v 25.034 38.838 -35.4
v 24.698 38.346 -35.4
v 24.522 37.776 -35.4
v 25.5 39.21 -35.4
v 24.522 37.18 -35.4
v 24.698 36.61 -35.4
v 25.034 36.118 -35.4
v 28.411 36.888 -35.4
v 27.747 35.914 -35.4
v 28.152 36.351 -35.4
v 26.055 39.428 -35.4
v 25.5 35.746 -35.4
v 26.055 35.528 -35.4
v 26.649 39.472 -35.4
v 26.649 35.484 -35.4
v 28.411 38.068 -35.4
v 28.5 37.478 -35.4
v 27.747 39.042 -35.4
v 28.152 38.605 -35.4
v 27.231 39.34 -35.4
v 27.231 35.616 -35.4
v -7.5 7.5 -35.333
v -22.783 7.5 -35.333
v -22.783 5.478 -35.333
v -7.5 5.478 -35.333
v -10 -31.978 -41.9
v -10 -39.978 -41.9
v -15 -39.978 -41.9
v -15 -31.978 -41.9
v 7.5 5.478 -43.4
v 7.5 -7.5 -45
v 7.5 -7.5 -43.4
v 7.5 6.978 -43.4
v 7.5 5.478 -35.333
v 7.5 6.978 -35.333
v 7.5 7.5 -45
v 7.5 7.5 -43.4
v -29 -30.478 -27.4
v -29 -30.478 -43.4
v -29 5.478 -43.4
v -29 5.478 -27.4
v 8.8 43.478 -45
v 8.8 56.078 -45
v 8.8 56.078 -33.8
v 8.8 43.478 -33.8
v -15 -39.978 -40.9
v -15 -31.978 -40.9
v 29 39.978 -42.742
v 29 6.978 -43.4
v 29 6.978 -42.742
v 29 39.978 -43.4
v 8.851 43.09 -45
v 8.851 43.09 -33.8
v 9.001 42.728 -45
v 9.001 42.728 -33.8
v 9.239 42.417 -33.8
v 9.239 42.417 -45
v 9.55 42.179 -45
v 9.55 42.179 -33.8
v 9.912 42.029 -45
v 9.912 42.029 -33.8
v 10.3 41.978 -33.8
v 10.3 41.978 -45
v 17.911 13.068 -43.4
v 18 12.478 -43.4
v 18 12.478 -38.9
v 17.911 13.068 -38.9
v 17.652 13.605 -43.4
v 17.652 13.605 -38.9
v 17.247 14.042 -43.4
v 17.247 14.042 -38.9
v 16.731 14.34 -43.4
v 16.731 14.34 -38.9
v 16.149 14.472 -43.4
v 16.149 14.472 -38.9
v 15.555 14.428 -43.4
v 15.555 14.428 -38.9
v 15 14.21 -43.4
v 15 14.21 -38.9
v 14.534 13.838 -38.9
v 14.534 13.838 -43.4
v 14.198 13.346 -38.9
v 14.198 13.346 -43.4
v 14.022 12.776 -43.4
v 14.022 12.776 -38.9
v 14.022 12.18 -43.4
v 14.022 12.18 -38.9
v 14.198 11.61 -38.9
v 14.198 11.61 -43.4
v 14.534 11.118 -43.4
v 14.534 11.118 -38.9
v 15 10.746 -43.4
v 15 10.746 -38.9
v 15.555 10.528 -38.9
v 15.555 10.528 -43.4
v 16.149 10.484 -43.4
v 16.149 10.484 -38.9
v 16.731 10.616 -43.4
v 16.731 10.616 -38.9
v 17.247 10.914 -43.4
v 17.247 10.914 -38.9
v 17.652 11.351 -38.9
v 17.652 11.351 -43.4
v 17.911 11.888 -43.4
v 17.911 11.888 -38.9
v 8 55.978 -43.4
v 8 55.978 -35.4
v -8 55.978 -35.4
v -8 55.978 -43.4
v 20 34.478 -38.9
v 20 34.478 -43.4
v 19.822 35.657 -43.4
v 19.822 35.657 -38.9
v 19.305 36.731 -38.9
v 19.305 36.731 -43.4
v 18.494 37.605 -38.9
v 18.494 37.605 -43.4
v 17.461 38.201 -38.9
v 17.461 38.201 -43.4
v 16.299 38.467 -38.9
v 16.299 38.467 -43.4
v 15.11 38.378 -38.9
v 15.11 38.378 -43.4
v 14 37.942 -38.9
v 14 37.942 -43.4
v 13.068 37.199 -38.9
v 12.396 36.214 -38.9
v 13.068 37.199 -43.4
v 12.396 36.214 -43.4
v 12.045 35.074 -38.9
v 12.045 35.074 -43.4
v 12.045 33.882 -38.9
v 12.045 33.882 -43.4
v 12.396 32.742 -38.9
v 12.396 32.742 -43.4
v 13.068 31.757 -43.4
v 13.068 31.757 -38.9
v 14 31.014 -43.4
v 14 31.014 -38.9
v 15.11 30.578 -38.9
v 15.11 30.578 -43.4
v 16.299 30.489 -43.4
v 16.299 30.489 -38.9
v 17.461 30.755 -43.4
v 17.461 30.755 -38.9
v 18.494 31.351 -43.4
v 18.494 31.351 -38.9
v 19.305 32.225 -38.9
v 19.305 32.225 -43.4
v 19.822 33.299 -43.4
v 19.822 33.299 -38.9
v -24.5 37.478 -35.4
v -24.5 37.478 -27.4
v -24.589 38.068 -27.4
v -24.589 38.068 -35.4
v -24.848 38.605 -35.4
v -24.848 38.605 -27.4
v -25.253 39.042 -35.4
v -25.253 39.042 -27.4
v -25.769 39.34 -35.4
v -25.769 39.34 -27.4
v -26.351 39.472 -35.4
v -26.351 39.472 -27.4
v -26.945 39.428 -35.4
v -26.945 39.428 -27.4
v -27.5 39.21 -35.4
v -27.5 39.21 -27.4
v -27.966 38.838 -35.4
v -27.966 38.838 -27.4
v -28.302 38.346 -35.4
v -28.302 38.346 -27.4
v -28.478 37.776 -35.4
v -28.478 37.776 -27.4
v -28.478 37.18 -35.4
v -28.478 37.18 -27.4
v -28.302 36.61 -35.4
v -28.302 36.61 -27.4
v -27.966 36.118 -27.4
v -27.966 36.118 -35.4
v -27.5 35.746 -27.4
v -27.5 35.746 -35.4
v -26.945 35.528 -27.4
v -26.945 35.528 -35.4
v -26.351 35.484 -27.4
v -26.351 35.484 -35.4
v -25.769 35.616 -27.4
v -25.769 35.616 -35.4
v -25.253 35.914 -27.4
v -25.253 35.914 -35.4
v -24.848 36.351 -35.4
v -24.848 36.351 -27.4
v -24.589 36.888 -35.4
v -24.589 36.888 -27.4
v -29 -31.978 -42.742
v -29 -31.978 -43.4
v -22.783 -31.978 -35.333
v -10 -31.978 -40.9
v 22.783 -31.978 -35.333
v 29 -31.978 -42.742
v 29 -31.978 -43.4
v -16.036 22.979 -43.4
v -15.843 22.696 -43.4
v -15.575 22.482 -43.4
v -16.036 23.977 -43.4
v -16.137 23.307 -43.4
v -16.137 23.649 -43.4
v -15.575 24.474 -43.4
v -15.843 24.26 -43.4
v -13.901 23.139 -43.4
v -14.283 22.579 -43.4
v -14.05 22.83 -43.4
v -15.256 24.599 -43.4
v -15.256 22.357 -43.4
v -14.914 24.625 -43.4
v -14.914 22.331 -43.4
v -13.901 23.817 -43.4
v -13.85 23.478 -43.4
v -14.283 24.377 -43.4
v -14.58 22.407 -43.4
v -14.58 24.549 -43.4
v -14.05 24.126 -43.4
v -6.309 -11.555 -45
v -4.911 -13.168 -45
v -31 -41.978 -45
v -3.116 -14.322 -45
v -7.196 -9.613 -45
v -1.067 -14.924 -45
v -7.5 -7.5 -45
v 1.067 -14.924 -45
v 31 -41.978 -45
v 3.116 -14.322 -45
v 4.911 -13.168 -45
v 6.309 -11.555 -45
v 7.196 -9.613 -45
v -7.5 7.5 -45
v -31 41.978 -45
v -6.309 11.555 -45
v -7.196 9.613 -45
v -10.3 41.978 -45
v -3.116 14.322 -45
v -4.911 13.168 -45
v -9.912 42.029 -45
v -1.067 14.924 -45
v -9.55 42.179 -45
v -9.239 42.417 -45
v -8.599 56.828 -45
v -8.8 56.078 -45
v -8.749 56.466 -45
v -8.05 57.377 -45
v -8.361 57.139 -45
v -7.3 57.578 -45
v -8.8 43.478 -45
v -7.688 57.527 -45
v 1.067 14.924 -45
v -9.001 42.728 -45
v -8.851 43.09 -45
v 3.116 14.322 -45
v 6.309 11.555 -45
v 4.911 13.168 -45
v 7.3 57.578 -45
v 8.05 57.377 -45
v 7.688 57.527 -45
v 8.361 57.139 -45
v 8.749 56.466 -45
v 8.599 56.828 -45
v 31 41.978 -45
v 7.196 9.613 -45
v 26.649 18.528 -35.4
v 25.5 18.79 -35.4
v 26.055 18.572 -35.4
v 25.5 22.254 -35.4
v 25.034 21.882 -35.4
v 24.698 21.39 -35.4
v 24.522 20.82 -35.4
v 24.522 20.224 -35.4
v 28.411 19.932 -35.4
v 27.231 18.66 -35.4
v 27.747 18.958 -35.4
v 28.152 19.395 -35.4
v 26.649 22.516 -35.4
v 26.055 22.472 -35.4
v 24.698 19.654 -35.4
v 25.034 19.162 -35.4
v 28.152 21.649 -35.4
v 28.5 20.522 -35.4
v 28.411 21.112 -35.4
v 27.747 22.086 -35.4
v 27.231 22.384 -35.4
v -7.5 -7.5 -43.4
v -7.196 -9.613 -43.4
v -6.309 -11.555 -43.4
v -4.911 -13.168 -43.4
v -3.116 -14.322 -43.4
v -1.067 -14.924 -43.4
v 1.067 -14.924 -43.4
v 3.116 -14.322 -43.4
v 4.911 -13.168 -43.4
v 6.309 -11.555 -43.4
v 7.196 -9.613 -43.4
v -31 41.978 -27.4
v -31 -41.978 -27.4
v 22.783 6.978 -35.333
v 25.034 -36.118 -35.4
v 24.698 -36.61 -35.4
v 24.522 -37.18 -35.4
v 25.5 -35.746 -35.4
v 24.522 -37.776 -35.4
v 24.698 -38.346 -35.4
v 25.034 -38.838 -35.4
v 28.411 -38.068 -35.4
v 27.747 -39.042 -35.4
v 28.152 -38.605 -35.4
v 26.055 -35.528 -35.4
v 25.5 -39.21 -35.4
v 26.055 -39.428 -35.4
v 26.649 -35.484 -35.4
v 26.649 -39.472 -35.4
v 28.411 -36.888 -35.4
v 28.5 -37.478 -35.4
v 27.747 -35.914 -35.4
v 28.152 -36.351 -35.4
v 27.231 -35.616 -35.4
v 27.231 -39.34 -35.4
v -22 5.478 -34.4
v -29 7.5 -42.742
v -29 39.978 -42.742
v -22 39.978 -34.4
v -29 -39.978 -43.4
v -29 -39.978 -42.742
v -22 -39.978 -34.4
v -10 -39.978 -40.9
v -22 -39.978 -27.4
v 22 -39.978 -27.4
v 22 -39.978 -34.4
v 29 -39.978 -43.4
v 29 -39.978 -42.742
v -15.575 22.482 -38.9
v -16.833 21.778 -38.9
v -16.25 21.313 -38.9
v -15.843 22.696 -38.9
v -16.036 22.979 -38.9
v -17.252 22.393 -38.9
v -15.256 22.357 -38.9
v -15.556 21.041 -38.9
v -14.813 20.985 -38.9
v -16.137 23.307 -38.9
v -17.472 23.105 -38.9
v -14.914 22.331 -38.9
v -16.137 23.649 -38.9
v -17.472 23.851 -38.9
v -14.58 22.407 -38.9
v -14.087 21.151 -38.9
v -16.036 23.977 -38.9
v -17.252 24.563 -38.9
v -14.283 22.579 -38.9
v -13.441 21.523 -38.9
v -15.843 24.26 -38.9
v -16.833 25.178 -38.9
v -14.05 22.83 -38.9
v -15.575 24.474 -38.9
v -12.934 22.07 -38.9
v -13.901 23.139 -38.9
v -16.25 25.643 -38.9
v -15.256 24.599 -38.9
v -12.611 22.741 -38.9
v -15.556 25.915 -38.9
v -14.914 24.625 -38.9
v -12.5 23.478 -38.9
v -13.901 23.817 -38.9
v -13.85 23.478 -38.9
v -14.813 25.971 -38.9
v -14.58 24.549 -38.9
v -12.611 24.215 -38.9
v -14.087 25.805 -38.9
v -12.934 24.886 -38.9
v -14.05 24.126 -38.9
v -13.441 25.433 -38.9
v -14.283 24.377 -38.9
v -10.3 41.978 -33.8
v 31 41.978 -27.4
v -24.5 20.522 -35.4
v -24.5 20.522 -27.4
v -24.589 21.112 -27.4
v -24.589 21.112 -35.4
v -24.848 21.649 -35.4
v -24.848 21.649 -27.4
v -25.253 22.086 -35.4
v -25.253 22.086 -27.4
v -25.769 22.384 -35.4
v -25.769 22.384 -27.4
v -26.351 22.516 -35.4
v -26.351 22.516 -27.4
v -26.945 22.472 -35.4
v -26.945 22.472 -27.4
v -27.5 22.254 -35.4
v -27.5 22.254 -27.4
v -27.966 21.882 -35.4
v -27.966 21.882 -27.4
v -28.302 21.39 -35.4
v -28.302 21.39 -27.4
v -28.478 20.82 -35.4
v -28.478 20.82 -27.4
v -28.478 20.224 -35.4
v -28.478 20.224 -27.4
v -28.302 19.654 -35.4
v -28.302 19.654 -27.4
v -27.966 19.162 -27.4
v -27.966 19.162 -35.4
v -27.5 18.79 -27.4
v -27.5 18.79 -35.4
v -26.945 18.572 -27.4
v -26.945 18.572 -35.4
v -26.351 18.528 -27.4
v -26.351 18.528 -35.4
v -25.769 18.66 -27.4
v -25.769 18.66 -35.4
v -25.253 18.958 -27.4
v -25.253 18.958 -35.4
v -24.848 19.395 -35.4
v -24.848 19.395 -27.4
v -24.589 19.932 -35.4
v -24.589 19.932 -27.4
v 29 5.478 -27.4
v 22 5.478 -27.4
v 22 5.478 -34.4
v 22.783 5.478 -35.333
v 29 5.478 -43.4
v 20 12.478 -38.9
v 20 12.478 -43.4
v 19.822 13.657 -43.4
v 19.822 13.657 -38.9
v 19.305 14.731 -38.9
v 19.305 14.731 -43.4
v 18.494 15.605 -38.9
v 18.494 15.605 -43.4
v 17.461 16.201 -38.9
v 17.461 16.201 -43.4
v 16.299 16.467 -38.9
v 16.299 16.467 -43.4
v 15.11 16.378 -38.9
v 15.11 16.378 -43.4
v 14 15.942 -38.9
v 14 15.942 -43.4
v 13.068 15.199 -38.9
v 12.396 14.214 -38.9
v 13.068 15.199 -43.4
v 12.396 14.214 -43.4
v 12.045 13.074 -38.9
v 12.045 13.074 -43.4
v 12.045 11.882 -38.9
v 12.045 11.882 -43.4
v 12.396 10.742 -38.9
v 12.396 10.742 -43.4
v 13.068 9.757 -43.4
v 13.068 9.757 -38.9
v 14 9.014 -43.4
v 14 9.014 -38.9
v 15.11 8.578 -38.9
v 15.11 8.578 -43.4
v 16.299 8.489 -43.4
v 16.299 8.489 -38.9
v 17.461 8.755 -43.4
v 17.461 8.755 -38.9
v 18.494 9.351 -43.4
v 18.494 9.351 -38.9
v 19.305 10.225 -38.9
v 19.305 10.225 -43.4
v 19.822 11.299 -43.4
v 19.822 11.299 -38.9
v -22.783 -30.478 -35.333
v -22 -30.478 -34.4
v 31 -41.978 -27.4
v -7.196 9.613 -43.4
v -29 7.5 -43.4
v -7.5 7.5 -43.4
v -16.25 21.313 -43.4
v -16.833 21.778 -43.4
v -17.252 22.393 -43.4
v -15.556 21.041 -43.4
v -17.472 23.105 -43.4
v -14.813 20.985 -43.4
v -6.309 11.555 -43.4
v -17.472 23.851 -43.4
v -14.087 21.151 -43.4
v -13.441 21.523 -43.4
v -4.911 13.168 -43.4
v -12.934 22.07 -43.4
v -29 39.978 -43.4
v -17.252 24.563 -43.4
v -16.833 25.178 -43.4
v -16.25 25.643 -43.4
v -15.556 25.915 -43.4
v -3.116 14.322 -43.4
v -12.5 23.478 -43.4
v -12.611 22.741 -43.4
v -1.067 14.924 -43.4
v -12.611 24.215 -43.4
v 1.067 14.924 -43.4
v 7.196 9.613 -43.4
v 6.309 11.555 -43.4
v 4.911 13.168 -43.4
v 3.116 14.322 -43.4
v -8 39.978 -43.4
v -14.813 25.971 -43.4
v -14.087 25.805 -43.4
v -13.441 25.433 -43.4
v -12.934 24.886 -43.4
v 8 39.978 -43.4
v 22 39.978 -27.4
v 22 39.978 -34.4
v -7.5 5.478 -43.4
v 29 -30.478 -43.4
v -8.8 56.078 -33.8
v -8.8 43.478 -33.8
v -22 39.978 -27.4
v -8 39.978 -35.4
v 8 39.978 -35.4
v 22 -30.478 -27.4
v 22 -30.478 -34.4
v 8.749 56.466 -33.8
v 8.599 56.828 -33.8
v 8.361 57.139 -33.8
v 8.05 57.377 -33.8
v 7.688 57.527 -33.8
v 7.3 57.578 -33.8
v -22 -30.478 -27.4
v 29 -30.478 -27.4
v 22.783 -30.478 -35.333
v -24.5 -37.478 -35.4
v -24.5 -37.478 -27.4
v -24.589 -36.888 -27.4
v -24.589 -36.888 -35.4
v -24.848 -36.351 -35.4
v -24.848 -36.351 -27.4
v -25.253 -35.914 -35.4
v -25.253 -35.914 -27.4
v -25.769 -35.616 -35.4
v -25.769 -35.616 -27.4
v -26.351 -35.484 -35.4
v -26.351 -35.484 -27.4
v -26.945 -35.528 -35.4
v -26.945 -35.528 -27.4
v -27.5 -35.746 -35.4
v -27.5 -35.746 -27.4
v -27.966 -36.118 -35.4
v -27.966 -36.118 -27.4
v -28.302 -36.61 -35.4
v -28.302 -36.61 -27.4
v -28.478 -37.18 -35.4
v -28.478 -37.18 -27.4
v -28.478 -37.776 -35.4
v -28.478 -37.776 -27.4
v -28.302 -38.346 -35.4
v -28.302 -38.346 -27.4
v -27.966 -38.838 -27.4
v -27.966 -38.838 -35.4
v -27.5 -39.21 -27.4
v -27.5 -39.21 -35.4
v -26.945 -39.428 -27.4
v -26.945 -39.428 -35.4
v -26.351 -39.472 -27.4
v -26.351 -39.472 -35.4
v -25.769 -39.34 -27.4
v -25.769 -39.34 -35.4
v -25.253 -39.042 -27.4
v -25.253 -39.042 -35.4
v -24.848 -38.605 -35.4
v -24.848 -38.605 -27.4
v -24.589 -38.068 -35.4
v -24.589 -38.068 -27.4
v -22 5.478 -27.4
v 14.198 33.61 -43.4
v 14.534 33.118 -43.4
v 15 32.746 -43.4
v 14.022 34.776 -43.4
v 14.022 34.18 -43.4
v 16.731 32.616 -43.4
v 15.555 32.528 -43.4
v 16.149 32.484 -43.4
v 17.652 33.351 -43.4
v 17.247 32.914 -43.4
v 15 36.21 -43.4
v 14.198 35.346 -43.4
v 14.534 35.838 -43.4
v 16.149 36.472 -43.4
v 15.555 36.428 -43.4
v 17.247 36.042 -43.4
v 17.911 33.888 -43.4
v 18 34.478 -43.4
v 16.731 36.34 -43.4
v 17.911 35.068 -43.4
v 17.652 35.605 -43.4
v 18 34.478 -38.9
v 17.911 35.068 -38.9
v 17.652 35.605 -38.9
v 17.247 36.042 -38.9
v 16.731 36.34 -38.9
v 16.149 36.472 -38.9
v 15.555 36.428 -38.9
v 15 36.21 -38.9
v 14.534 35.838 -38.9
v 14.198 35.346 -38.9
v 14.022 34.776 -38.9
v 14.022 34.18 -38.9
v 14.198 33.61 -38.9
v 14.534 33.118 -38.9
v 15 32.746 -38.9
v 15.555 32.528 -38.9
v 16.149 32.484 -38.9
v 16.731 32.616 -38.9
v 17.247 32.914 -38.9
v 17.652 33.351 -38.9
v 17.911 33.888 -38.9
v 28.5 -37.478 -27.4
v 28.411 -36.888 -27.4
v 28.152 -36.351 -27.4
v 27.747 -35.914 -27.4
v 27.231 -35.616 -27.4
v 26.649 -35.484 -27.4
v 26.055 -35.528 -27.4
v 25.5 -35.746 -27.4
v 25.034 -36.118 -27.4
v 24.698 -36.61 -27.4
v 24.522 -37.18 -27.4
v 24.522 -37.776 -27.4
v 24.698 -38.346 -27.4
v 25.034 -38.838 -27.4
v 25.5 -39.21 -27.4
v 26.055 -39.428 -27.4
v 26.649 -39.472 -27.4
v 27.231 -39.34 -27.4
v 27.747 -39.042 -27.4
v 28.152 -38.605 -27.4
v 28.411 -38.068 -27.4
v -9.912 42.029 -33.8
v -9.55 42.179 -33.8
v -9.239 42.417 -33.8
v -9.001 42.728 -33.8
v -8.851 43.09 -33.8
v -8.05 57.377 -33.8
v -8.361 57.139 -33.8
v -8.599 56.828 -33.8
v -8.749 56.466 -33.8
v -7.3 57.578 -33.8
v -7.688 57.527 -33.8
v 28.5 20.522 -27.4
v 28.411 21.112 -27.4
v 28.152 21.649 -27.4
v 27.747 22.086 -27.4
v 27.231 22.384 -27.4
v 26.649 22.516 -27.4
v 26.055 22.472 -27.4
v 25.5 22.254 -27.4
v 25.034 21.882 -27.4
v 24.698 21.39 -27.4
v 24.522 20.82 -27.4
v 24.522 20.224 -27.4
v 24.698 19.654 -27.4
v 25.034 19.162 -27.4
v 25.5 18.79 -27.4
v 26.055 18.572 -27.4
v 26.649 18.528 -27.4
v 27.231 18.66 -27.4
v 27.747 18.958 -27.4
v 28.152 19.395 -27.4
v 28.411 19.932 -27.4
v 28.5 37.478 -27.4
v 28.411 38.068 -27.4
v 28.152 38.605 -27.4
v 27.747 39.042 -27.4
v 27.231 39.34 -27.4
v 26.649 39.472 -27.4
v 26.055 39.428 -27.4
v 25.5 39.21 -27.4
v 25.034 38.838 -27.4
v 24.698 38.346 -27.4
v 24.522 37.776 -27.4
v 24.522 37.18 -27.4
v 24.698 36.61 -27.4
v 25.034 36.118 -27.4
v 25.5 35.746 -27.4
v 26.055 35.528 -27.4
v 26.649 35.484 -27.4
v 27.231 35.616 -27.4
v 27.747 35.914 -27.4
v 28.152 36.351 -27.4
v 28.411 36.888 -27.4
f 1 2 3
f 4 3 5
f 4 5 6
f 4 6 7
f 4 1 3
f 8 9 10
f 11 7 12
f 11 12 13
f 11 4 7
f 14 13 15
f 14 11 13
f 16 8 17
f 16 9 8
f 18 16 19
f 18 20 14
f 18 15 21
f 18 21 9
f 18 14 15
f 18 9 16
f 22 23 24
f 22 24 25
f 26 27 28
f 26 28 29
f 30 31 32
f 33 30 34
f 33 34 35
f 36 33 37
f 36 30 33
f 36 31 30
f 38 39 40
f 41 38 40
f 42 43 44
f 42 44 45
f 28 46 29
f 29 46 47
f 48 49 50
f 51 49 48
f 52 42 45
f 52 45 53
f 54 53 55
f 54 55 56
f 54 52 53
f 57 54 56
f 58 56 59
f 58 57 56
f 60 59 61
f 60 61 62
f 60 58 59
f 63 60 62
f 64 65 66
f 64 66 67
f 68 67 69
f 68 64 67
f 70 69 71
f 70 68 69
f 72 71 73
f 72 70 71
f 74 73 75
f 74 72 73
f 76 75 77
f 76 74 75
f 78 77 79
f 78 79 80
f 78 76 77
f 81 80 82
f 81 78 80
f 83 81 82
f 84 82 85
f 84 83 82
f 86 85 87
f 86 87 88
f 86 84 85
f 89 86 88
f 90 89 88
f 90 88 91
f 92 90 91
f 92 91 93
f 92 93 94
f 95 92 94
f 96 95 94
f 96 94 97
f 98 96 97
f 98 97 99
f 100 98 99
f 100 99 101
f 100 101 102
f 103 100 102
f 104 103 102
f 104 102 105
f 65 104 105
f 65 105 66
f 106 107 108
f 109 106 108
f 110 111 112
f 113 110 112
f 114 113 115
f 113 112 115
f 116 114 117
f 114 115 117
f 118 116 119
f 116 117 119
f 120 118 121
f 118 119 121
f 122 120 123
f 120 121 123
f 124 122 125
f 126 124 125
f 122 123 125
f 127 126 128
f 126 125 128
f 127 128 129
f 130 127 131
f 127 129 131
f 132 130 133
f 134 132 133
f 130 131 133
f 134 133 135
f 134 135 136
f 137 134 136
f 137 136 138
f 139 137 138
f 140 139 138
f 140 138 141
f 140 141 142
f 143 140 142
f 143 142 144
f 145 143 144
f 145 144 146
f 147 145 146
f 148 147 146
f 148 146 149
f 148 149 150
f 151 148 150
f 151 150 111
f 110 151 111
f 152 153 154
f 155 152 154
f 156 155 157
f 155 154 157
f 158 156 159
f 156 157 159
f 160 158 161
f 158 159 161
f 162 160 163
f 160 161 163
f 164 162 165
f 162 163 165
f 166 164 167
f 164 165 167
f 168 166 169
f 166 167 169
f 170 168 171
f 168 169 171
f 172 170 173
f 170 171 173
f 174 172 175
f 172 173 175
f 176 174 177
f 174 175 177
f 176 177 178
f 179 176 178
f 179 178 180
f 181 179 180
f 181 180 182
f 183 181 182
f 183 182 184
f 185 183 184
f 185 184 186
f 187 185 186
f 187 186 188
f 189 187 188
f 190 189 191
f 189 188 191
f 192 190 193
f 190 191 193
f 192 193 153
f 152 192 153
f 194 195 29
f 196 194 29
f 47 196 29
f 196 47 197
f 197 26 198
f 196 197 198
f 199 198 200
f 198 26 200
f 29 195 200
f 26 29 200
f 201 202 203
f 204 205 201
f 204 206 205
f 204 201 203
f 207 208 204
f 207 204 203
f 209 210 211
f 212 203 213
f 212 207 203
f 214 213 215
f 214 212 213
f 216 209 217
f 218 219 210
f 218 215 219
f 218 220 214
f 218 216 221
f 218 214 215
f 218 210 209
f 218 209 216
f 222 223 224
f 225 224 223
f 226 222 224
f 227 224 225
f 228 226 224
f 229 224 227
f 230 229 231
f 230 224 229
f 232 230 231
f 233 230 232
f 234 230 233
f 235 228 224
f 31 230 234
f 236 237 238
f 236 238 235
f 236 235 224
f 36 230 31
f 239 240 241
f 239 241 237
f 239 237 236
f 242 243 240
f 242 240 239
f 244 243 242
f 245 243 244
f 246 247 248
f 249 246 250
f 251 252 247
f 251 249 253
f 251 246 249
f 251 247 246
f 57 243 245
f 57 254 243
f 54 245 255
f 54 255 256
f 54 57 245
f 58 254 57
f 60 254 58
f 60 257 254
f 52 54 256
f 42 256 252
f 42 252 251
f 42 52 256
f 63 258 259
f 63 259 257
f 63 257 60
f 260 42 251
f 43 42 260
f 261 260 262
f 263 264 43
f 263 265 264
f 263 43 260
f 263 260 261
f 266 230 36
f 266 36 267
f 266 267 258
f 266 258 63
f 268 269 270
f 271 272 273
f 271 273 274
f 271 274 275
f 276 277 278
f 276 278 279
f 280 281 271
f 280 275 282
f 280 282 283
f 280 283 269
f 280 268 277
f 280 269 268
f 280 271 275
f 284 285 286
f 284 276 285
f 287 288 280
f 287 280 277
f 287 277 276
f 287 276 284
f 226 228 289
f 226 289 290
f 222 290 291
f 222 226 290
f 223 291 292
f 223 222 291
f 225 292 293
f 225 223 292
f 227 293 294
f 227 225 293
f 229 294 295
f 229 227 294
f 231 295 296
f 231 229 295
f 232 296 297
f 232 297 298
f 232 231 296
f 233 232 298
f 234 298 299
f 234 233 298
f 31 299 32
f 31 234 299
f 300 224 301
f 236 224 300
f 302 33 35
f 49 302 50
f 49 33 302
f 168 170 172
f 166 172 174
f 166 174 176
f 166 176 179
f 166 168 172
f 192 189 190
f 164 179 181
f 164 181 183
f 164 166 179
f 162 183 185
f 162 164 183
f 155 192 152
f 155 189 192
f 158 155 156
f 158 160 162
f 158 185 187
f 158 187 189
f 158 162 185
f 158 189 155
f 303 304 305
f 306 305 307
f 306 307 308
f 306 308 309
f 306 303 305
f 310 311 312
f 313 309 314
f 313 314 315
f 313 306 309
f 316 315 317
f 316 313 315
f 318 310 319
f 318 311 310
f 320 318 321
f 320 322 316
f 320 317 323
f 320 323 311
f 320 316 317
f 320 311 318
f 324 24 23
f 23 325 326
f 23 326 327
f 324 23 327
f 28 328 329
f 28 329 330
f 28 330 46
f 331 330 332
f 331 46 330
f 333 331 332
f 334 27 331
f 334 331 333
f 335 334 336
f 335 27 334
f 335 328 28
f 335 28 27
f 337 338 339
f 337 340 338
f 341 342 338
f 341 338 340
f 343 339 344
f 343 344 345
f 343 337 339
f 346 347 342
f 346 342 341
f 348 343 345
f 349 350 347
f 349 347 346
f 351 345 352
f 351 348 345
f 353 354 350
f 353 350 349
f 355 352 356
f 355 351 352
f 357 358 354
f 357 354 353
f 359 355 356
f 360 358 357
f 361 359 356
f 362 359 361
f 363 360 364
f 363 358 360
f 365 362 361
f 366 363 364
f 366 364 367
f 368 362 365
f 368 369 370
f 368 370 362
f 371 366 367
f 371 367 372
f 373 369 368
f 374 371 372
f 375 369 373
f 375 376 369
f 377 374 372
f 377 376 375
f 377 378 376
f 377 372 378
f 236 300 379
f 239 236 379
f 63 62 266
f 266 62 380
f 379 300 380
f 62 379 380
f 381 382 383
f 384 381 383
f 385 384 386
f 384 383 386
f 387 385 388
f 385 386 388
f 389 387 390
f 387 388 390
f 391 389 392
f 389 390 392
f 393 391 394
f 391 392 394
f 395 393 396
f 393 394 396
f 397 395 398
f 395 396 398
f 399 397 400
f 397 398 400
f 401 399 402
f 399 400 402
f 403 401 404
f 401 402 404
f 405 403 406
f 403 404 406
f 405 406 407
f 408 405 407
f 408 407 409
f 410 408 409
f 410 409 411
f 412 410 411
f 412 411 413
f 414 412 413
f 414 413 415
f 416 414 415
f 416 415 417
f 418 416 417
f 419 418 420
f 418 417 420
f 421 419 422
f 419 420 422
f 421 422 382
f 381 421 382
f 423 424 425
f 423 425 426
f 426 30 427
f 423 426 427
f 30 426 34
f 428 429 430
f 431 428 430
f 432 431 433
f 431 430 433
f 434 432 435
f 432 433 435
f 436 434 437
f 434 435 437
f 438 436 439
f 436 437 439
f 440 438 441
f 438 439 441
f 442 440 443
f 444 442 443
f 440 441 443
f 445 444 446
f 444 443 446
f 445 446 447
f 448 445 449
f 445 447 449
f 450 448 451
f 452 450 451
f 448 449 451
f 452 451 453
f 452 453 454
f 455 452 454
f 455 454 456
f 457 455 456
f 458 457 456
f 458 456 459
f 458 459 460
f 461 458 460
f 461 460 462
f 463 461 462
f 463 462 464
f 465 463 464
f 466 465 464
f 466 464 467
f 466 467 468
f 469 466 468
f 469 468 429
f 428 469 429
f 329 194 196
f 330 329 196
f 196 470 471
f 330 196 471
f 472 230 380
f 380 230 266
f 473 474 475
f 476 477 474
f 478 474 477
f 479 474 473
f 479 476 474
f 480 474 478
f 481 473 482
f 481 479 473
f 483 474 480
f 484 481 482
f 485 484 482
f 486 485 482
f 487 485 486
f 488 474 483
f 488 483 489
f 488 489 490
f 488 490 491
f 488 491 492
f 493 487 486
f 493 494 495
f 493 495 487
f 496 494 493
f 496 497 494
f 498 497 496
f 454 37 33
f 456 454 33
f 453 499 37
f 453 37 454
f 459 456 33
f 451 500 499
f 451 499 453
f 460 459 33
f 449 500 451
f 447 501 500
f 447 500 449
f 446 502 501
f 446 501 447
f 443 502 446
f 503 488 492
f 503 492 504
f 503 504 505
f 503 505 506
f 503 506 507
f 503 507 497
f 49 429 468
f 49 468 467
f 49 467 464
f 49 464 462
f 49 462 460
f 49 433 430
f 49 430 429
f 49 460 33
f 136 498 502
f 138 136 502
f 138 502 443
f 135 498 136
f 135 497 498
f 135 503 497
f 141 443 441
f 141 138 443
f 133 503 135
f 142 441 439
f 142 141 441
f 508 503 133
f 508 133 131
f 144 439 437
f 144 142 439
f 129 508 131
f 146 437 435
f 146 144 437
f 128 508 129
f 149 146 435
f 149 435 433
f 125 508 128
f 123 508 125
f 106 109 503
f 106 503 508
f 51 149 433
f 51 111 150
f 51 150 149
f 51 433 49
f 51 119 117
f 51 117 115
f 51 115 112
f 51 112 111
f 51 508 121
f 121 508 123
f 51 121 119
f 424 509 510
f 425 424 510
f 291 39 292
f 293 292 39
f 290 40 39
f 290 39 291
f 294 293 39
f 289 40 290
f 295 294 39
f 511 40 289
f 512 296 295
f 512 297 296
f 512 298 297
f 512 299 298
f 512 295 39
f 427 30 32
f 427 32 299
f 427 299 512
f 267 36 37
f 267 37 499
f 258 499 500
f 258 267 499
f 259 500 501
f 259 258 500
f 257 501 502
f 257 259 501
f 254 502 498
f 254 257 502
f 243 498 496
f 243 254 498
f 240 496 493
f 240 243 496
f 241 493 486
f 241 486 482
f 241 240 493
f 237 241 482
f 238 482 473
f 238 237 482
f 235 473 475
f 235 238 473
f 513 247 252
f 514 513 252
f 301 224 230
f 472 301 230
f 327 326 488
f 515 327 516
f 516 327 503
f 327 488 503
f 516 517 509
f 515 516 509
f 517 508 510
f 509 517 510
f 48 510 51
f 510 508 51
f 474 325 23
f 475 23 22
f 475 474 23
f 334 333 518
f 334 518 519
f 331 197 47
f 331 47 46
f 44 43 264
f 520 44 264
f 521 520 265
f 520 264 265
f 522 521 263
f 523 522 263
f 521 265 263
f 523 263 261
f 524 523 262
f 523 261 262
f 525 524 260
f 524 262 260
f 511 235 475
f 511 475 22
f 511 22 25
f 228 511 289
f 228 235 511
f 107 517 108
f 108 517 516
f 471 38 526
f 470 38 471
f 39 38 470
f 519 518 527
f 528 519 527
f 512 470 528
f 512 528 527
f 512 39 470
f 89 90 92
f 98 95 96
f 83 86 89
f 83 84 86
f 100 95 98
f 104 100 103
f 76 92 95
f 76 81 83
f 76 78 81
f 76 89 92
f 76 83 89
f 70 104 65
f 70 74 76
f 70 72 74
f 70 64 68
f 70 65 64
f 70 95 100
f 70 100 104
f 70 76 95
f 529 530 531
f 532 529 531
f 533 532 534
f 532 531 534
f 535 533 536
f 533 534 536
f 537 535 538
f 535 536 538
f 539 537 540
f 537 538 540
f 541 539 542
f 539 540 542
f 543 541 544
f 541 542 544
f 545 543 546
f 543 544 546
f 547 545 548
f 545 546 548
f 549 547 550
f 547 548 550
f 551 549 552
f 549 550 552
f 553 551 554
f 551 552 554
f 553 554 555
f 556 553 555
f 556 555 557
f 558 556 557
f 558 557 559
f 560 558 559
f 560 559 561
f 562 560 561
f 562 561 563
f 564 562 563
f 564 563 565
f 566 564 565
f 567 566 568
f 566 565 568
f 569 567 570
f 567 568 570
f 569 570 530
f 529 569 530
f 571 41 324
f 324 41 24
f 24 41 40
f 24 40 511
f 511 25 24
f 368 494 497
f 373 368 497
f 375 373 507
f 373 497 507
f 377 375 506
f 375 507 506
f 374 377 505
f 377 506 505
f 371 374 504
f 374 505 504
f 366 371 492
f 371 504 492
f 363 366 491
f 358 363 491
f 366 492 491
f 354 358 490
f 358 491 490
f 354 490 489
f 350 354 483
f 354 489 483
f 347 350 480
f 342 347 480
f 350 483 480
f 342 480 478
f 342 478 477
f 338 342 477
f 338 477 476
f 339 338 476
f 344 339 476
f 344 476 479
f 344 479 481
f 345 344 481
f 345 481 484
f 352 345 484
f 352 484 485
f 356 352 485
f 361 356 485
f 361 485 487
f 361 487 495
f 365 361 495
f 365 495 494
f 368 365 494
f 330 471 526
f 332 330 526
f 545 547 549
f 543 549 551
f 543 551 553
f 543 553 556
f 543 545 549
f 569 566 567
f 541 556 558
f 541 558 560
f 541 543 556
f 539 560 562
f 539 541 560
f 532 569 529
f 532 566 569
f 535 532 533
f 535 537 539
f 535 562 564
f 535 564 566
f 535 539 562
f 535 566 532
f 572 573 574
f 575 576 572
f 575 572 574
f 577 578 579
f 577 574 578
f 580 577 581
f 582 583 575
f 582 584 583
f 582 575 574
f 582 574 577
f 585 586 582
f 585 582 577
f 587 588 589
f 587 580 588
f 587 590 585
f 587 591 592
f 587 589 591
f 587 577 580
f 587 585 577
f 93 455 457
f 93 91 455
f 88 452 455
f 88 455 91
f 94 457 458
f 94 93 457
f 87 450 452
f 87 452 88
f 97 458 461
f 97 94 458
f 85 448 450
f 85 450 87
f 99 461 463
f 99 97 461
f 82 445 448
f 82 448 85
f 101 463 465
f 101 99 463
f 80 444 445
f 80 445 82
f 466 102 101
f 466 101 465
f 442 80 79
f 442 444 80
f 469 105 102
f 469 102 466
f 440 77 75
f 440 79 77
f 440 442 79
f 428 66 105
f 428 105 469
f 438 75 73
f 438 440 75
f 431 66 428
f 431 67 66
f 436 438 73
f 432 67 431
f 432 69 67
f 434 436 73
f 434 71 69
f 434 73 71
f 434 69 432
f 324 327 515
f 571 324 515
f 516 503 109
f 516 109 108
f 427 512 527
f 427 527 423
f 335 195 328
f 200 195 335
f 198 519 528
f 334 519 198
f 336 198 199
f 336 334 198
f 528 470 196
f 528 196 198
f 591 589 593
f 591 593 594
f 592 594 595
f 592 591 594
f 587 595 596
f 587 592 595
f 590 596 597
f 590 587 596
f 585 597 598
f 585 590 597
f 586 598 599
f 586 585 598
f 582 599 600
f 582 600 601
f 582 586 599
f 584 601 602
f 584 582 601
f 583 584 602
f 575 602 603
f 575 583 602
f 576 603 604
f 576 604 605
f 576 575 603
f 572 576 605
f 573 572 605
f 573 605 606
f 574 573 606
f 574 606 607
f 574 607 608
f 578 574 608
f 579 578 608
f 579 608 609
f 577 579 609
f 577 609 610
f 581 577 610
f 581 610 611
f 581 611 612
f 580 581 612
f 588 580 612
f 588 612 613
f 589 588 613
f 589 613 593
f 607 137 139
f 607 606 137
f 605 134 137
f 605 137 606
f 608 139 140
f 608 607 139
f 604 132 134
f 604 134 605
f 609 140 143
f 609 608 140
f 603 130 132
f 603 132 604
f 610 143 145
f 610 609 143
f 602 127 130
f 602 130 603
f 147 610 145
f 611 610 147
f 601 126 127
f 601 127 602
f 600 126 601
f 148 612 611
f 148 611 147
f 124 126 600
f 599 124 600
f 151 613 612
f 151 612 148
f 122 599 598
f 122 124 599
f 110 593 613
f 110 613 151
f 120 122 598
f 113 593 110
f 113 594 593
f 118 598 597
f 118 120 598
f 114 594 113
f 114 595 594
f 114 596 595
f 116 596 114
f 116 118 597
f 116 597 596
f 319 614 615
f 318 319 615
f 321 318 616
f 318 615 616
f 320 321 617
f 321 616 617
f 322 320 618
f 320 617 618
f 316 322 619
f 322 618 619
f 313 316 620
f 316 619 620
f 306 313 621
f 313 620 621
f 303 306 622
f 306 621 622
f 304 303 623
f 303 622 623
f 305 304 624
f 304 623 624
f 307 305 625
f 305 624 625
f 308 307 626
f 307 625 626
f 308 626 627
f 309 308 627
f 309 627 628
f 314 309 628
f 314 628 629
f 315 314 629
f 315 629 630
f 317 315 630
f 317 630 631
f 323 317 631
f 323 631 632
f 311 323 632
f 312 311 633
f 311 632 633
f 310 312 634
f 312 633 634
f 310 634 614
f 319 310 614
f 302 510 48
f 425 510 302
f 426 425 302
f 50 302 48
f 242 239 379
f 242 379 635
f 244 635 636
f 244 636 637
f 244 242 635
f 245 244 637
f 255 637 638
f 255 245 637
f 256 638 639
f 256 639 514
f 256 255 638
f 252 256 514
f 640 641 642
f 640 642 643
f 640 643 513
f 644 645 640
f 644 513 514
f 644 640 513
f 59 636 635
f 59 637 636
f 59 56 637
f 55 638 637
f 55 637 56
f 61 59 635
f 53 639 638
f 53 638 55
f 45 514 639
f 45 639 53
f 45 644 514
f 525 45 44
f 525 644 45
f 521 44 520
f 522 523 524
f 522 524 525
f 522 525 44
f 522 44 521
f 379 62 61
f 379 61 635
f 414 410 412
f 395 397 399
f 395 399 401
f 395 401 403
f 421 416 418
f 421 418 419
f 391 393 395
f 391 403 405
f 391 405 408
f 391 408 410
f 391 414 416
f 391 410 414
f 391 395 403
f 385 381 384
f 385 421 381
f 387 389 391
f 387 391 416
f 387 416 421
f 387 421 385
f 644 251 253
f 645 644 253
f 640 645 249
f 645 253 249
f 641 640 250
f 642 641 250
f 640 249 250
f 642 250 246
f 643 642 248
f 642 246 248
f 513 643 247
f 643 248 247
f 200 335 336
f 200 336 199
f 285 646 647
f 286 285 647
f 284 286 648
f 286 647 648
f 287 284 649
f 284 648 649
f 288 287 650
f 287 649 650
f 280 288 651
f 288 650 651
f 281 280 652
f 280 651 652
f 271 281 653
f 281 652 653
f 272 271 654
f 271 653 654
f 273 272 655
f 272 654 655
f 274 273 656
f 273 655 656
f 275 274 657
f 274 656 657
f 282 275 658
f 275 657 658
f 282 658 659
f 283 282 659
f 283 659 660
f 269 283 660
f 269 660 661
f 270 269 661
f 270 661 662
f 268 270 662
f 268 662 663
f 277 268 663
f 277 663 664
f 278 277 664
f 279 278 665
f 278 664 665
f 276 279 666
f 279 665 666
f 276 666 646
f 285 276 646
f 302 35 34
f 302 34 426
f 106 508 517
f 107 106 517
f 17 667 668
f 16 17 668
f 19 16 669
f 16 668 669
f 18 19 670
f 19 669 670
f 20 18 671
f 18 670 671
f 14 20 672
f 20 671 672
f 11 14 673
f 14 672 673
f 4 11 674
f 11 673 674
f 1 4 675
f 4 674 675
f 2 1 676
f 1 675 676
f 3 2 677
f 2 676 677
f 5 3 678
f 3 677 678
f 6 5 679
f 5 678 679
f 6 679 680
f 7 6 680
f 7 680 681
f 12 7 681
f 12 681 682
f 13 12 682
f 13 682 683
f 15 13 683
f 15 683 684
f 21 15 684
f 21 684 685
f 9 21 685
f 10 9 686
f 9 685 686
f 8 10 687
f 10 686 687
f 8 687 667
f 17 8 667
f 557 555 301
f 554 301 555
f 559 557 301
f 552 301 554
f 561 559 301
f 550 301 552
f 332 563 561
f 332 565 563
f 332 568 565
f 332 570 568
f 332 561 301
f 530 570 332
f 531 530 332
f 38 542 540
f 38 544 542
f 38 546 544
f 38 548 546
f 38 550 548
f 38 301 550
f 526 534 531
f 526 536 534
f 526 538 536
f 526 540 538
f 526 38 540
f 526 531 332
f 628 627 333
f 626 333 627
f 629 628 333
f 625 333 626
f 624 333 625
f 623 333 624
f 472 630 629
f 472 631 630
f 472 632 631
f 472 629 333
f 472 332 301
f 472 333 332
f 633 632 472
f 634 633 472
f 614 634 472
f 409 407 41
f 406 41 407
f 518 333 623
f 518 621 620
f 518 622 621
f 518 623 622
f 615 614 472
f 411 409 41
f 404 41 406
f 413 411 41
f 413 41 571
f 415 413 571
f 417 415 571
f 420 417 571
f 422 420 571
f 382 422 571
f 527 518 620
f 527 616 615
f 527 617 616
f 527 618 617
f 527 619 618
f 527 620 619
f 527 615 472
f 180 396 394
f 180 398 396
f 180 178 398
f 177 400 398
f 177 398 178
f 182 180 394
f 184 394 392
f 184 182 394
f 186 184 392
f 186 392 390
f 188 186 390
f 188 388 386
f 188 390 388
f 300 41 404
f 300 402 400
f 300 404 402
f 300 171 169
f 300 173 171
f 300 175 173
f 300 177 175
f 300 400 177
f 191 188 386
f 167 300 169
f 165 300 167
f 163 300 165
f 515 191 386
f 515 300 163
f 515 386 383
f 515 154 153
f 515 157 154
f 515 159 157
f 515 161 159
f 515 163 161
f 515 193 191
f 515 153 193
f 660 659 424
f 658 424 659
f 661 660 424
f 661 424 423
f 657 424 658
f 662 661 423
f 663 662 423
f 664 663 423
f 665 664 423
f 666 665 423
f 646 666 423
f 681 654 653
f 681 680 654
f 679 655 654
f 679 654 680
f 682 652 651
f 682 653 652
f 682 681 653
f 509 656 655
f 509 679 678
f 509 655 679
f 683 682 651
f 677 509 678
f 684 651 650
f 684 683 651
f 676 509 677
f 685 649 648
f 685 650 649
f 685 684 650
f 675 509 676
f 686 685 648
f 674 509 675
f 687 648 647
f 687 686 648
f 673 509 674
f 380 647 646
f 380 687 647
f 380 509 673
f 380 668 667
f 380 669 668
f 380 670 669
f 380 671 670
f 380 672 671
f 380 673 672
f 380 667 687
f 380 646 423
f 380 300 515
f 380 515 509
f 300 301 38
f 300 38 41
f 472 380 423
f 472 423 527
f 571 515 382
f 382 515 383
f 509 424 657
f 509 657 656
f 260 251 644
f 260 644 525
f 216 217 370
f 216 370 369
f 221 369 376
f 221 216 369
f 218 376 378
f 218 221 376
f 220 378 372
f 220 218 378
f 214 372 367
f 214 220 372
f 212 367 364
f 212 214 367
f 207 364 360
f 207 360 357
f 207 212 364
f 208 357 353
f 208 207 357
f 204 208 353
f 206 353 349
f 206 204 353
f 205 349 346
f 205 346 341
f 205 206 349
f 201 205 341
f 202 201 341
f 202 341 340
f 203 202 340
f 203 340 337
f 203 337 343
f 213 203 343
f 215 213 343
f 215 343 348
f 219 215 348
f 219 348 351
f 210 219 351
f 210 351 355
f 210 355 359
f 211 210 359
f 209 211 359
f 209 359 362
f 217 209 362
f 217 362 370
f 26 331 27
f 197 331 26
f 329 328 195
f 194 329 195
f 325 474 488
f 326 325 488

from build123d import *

# Parameters (mm, degrees)
SKETCH_W        = 62
SKETCH_H        = 83.956
PAD_DEPTH       = 1.6
SKETCH001_W     = 62
SKETCH001_H     = 83.956
SKETCH001_W_2   = 58
SKETCH001_H_2   = 79.956
PAD001_DEPTH    = 17.6
PAD002_DEPTH    = 41.978
SKETCH003_R     = 4
SKETCH003_R_2   = 2
SKETCH003_R_3   = 2.5
SKETCH003_R_4   = 1.15
PAD003_DEPTH    = 6.1
PAD004_START    = -10
PAD004_DEPTH    = 5
SKETCH005_W     = 21.5
SKETCH005_H     = 1.5
SKETCH005_H_2   = 2.022
SKETCH005_W_2   = 58
PAD005_DEPTH    = 8.066667
SKETCH010_W     = 58
SKETCH010_H     = 35.956
POCKET006_DEPTH = 17.6
PAD008_DEPTH    = 11.2
SKETCH012_W     = 16
SKETCH012_H     = 8
POCKET003_DEPTH = 16
SKETCH013_R     = 2
POCKET004_DEPTH = 8


with BuildPart() as part:
    # Sketch → Pad (new body)
    with BuildSketch(Plane.XY):
        Rectangle(SKETCH_W, SKETCH_H)
        with BuildLine():
            ThreePointArc((7.5, 7.5), (0, 15), (-7.5, 7.5))
            Line((-7.5, 7.5), (-7.5, -7.5))
            ThreePointArc((-7.5, -7.5), (0, -15), (7.5, -7.5))
            Line((7.5, -7.5), (7.5, 7.5))
        make_face(mode=Mode.SUBTRACT)
    extrude(amount=PAD_DEPTH)

    # Sketch001 → Pad001 (join)
    with BuildSketch(Plane.XY):
        Rectangle(SKETCH001_W, SKETCH001_H)
        Rectangle(SKETCH001_W_2, SKETCH001_H_2, mode=Mode.SUBTRACT)
    extrude(amount=PAD001_DEPTH)

    # Sketch002 → Pad002 (join, symmetric)
    with BuildSketch(Plane.XZ):
        Polygon((-29, 17.6), (-29, 2.257725), (-22, 10.6), (-22, 17.6), align=None)
        Polygon((22, 17.6), (22, 10.6), (29, 2.257725), (29, 17.6), align=None)
    extrude(amount=PAD002_DEPTH, both=True)

    # Sketch003 → Pad003 (join)
    with BuildSketch(Plane.XY):
        with Locations((16, 34.478)):
            Circle(SKETCH003_R)
        with Locations((16, 34.478)):
            Circle(SKETCH003_R_2, mode=Mode.SUBTRACT)
        with Locations((16, 12.478)):
            Circle(SKETCH003_R)
        with Locations((16, 12.478)):
            Circle(SKETCH003_R_2, mode=Mode.SUBTRACT)
        with Locations((-15, 23.478)):
            Circle(SKETCH003_R_3)
        with Locations((-15, 23.478)):
            Circle(SKETCH003_R_4, mode=Mode.SUBTRACT)
    extrude(amount=PAD003_DEPTH)

    # Sketch004 → Pad004 (join)
    with BuildSketch(Plane.YZ.offset(PAD004_START)):
        Polygon((-30.978, 0), (-30.978, 4.1), (-39.978, 4.1), (-39.978, 3.1), (-31.978, 3.1), (-31.978, 0), align=None)
    extrude(amount=-PAD004_DEPTH)

    # Sketch005 → Pad005 (join)
    with BuildSketch(Plane.XY.offset(1.6)):
        with Locations((18.25, 6.228)):
            Rectangle(SKETCH005_W, SKETCH005_H)
        with Locations((-18.25, 6.489)):
            Rectangle(SKETCH005_W, SKETCH005_H_2)
        with Locations((0, -31.228)):
            Rectangle(SKETCH005_W_2, SKETCH005_H)
    extrude(amount=PAD005_DEPTH)

    # Sketch010 → Pocket006 (cut)
    with BuildSketch(Plane.XY.offset(1.6)):
        with Locations((0, -12.5)):
            Rectangle(SKETCH010_W, SKETCH010_H)
    extrude(amount=POCKET006_DEPTH, mode=Mode.SUBTRACT)

    # Sketch011 → Pad008 (join)
    with BuildSketch(Plane.XY):
        with BuildLine():
            Line((-10.3, 41.978), (10.3, 41.978))
            ThreePointArc((8.8, 43.478), (9.23934, 42.41734), (10.3, 41.978))
            Line((8.8, 56.078), (8.8, 43.478))
            ThreePointArc((8.8, 56.078), (8.36066, 57.13866), (7.3, 57.578))
            Line((-7.3, 57.578), (7.3, 57.578))
            ThreePointArc((-7.3, 57.578), (-8.36066, 57.13866), (-8.8, 56.078))
            Line((-8.8, 56.078), (-8.8, 43.478))
            ThreePointArc((-10.3, 41.978), (-9.23934, 42.41734), (-8.8, 43.478))
        make_face()
    extrude(amount=PAD008_DEPTH)

    # Sketch012 → Pocket003 (cut)
    with BuildSketch(Plane(origin=(0, 39.978, 0), x_dir=(-1, 0, 0), z_dir=(0, 1, 0))):
        with Locations((0, 5.6)):
            Rectangle(SKETCH012_W, SKETCH012_H)
    extrude(amount=POCKET003_DEPTH, mode=Mode.SUBTRACT)

    # Sketch013 (on DatumPlane) → Pocket004 (cut)
    with BuildSketch(Plane.XY.offset(17.6)):
        with Locations((-26.5, 37.478)):
            Circle(SKETCH013_R)
        with Locations((-26.5, -37.478)):
            Circle(SKETCH013_R)
        with Locations((26.5, -37.478)):
            Circle(SKETCH013_R)
        with Locations((26.5, 37.478)):
            Circle(SKETCH013_R)
        with Locations((-26.5, 20.522)):
            Circle(SKETCH013_R)
        with Locations((26.5, 20.522)):
            Circle(SKETCH013_R)
    extrude(amount=-POCKET004_DEPTH, mode=Mode.SUBTRACT)


with BuildPart() as part_1:
    # Body placement: moved
    add(part.part.moved(Location((0, 0, -45))))


solid = part_1.part
